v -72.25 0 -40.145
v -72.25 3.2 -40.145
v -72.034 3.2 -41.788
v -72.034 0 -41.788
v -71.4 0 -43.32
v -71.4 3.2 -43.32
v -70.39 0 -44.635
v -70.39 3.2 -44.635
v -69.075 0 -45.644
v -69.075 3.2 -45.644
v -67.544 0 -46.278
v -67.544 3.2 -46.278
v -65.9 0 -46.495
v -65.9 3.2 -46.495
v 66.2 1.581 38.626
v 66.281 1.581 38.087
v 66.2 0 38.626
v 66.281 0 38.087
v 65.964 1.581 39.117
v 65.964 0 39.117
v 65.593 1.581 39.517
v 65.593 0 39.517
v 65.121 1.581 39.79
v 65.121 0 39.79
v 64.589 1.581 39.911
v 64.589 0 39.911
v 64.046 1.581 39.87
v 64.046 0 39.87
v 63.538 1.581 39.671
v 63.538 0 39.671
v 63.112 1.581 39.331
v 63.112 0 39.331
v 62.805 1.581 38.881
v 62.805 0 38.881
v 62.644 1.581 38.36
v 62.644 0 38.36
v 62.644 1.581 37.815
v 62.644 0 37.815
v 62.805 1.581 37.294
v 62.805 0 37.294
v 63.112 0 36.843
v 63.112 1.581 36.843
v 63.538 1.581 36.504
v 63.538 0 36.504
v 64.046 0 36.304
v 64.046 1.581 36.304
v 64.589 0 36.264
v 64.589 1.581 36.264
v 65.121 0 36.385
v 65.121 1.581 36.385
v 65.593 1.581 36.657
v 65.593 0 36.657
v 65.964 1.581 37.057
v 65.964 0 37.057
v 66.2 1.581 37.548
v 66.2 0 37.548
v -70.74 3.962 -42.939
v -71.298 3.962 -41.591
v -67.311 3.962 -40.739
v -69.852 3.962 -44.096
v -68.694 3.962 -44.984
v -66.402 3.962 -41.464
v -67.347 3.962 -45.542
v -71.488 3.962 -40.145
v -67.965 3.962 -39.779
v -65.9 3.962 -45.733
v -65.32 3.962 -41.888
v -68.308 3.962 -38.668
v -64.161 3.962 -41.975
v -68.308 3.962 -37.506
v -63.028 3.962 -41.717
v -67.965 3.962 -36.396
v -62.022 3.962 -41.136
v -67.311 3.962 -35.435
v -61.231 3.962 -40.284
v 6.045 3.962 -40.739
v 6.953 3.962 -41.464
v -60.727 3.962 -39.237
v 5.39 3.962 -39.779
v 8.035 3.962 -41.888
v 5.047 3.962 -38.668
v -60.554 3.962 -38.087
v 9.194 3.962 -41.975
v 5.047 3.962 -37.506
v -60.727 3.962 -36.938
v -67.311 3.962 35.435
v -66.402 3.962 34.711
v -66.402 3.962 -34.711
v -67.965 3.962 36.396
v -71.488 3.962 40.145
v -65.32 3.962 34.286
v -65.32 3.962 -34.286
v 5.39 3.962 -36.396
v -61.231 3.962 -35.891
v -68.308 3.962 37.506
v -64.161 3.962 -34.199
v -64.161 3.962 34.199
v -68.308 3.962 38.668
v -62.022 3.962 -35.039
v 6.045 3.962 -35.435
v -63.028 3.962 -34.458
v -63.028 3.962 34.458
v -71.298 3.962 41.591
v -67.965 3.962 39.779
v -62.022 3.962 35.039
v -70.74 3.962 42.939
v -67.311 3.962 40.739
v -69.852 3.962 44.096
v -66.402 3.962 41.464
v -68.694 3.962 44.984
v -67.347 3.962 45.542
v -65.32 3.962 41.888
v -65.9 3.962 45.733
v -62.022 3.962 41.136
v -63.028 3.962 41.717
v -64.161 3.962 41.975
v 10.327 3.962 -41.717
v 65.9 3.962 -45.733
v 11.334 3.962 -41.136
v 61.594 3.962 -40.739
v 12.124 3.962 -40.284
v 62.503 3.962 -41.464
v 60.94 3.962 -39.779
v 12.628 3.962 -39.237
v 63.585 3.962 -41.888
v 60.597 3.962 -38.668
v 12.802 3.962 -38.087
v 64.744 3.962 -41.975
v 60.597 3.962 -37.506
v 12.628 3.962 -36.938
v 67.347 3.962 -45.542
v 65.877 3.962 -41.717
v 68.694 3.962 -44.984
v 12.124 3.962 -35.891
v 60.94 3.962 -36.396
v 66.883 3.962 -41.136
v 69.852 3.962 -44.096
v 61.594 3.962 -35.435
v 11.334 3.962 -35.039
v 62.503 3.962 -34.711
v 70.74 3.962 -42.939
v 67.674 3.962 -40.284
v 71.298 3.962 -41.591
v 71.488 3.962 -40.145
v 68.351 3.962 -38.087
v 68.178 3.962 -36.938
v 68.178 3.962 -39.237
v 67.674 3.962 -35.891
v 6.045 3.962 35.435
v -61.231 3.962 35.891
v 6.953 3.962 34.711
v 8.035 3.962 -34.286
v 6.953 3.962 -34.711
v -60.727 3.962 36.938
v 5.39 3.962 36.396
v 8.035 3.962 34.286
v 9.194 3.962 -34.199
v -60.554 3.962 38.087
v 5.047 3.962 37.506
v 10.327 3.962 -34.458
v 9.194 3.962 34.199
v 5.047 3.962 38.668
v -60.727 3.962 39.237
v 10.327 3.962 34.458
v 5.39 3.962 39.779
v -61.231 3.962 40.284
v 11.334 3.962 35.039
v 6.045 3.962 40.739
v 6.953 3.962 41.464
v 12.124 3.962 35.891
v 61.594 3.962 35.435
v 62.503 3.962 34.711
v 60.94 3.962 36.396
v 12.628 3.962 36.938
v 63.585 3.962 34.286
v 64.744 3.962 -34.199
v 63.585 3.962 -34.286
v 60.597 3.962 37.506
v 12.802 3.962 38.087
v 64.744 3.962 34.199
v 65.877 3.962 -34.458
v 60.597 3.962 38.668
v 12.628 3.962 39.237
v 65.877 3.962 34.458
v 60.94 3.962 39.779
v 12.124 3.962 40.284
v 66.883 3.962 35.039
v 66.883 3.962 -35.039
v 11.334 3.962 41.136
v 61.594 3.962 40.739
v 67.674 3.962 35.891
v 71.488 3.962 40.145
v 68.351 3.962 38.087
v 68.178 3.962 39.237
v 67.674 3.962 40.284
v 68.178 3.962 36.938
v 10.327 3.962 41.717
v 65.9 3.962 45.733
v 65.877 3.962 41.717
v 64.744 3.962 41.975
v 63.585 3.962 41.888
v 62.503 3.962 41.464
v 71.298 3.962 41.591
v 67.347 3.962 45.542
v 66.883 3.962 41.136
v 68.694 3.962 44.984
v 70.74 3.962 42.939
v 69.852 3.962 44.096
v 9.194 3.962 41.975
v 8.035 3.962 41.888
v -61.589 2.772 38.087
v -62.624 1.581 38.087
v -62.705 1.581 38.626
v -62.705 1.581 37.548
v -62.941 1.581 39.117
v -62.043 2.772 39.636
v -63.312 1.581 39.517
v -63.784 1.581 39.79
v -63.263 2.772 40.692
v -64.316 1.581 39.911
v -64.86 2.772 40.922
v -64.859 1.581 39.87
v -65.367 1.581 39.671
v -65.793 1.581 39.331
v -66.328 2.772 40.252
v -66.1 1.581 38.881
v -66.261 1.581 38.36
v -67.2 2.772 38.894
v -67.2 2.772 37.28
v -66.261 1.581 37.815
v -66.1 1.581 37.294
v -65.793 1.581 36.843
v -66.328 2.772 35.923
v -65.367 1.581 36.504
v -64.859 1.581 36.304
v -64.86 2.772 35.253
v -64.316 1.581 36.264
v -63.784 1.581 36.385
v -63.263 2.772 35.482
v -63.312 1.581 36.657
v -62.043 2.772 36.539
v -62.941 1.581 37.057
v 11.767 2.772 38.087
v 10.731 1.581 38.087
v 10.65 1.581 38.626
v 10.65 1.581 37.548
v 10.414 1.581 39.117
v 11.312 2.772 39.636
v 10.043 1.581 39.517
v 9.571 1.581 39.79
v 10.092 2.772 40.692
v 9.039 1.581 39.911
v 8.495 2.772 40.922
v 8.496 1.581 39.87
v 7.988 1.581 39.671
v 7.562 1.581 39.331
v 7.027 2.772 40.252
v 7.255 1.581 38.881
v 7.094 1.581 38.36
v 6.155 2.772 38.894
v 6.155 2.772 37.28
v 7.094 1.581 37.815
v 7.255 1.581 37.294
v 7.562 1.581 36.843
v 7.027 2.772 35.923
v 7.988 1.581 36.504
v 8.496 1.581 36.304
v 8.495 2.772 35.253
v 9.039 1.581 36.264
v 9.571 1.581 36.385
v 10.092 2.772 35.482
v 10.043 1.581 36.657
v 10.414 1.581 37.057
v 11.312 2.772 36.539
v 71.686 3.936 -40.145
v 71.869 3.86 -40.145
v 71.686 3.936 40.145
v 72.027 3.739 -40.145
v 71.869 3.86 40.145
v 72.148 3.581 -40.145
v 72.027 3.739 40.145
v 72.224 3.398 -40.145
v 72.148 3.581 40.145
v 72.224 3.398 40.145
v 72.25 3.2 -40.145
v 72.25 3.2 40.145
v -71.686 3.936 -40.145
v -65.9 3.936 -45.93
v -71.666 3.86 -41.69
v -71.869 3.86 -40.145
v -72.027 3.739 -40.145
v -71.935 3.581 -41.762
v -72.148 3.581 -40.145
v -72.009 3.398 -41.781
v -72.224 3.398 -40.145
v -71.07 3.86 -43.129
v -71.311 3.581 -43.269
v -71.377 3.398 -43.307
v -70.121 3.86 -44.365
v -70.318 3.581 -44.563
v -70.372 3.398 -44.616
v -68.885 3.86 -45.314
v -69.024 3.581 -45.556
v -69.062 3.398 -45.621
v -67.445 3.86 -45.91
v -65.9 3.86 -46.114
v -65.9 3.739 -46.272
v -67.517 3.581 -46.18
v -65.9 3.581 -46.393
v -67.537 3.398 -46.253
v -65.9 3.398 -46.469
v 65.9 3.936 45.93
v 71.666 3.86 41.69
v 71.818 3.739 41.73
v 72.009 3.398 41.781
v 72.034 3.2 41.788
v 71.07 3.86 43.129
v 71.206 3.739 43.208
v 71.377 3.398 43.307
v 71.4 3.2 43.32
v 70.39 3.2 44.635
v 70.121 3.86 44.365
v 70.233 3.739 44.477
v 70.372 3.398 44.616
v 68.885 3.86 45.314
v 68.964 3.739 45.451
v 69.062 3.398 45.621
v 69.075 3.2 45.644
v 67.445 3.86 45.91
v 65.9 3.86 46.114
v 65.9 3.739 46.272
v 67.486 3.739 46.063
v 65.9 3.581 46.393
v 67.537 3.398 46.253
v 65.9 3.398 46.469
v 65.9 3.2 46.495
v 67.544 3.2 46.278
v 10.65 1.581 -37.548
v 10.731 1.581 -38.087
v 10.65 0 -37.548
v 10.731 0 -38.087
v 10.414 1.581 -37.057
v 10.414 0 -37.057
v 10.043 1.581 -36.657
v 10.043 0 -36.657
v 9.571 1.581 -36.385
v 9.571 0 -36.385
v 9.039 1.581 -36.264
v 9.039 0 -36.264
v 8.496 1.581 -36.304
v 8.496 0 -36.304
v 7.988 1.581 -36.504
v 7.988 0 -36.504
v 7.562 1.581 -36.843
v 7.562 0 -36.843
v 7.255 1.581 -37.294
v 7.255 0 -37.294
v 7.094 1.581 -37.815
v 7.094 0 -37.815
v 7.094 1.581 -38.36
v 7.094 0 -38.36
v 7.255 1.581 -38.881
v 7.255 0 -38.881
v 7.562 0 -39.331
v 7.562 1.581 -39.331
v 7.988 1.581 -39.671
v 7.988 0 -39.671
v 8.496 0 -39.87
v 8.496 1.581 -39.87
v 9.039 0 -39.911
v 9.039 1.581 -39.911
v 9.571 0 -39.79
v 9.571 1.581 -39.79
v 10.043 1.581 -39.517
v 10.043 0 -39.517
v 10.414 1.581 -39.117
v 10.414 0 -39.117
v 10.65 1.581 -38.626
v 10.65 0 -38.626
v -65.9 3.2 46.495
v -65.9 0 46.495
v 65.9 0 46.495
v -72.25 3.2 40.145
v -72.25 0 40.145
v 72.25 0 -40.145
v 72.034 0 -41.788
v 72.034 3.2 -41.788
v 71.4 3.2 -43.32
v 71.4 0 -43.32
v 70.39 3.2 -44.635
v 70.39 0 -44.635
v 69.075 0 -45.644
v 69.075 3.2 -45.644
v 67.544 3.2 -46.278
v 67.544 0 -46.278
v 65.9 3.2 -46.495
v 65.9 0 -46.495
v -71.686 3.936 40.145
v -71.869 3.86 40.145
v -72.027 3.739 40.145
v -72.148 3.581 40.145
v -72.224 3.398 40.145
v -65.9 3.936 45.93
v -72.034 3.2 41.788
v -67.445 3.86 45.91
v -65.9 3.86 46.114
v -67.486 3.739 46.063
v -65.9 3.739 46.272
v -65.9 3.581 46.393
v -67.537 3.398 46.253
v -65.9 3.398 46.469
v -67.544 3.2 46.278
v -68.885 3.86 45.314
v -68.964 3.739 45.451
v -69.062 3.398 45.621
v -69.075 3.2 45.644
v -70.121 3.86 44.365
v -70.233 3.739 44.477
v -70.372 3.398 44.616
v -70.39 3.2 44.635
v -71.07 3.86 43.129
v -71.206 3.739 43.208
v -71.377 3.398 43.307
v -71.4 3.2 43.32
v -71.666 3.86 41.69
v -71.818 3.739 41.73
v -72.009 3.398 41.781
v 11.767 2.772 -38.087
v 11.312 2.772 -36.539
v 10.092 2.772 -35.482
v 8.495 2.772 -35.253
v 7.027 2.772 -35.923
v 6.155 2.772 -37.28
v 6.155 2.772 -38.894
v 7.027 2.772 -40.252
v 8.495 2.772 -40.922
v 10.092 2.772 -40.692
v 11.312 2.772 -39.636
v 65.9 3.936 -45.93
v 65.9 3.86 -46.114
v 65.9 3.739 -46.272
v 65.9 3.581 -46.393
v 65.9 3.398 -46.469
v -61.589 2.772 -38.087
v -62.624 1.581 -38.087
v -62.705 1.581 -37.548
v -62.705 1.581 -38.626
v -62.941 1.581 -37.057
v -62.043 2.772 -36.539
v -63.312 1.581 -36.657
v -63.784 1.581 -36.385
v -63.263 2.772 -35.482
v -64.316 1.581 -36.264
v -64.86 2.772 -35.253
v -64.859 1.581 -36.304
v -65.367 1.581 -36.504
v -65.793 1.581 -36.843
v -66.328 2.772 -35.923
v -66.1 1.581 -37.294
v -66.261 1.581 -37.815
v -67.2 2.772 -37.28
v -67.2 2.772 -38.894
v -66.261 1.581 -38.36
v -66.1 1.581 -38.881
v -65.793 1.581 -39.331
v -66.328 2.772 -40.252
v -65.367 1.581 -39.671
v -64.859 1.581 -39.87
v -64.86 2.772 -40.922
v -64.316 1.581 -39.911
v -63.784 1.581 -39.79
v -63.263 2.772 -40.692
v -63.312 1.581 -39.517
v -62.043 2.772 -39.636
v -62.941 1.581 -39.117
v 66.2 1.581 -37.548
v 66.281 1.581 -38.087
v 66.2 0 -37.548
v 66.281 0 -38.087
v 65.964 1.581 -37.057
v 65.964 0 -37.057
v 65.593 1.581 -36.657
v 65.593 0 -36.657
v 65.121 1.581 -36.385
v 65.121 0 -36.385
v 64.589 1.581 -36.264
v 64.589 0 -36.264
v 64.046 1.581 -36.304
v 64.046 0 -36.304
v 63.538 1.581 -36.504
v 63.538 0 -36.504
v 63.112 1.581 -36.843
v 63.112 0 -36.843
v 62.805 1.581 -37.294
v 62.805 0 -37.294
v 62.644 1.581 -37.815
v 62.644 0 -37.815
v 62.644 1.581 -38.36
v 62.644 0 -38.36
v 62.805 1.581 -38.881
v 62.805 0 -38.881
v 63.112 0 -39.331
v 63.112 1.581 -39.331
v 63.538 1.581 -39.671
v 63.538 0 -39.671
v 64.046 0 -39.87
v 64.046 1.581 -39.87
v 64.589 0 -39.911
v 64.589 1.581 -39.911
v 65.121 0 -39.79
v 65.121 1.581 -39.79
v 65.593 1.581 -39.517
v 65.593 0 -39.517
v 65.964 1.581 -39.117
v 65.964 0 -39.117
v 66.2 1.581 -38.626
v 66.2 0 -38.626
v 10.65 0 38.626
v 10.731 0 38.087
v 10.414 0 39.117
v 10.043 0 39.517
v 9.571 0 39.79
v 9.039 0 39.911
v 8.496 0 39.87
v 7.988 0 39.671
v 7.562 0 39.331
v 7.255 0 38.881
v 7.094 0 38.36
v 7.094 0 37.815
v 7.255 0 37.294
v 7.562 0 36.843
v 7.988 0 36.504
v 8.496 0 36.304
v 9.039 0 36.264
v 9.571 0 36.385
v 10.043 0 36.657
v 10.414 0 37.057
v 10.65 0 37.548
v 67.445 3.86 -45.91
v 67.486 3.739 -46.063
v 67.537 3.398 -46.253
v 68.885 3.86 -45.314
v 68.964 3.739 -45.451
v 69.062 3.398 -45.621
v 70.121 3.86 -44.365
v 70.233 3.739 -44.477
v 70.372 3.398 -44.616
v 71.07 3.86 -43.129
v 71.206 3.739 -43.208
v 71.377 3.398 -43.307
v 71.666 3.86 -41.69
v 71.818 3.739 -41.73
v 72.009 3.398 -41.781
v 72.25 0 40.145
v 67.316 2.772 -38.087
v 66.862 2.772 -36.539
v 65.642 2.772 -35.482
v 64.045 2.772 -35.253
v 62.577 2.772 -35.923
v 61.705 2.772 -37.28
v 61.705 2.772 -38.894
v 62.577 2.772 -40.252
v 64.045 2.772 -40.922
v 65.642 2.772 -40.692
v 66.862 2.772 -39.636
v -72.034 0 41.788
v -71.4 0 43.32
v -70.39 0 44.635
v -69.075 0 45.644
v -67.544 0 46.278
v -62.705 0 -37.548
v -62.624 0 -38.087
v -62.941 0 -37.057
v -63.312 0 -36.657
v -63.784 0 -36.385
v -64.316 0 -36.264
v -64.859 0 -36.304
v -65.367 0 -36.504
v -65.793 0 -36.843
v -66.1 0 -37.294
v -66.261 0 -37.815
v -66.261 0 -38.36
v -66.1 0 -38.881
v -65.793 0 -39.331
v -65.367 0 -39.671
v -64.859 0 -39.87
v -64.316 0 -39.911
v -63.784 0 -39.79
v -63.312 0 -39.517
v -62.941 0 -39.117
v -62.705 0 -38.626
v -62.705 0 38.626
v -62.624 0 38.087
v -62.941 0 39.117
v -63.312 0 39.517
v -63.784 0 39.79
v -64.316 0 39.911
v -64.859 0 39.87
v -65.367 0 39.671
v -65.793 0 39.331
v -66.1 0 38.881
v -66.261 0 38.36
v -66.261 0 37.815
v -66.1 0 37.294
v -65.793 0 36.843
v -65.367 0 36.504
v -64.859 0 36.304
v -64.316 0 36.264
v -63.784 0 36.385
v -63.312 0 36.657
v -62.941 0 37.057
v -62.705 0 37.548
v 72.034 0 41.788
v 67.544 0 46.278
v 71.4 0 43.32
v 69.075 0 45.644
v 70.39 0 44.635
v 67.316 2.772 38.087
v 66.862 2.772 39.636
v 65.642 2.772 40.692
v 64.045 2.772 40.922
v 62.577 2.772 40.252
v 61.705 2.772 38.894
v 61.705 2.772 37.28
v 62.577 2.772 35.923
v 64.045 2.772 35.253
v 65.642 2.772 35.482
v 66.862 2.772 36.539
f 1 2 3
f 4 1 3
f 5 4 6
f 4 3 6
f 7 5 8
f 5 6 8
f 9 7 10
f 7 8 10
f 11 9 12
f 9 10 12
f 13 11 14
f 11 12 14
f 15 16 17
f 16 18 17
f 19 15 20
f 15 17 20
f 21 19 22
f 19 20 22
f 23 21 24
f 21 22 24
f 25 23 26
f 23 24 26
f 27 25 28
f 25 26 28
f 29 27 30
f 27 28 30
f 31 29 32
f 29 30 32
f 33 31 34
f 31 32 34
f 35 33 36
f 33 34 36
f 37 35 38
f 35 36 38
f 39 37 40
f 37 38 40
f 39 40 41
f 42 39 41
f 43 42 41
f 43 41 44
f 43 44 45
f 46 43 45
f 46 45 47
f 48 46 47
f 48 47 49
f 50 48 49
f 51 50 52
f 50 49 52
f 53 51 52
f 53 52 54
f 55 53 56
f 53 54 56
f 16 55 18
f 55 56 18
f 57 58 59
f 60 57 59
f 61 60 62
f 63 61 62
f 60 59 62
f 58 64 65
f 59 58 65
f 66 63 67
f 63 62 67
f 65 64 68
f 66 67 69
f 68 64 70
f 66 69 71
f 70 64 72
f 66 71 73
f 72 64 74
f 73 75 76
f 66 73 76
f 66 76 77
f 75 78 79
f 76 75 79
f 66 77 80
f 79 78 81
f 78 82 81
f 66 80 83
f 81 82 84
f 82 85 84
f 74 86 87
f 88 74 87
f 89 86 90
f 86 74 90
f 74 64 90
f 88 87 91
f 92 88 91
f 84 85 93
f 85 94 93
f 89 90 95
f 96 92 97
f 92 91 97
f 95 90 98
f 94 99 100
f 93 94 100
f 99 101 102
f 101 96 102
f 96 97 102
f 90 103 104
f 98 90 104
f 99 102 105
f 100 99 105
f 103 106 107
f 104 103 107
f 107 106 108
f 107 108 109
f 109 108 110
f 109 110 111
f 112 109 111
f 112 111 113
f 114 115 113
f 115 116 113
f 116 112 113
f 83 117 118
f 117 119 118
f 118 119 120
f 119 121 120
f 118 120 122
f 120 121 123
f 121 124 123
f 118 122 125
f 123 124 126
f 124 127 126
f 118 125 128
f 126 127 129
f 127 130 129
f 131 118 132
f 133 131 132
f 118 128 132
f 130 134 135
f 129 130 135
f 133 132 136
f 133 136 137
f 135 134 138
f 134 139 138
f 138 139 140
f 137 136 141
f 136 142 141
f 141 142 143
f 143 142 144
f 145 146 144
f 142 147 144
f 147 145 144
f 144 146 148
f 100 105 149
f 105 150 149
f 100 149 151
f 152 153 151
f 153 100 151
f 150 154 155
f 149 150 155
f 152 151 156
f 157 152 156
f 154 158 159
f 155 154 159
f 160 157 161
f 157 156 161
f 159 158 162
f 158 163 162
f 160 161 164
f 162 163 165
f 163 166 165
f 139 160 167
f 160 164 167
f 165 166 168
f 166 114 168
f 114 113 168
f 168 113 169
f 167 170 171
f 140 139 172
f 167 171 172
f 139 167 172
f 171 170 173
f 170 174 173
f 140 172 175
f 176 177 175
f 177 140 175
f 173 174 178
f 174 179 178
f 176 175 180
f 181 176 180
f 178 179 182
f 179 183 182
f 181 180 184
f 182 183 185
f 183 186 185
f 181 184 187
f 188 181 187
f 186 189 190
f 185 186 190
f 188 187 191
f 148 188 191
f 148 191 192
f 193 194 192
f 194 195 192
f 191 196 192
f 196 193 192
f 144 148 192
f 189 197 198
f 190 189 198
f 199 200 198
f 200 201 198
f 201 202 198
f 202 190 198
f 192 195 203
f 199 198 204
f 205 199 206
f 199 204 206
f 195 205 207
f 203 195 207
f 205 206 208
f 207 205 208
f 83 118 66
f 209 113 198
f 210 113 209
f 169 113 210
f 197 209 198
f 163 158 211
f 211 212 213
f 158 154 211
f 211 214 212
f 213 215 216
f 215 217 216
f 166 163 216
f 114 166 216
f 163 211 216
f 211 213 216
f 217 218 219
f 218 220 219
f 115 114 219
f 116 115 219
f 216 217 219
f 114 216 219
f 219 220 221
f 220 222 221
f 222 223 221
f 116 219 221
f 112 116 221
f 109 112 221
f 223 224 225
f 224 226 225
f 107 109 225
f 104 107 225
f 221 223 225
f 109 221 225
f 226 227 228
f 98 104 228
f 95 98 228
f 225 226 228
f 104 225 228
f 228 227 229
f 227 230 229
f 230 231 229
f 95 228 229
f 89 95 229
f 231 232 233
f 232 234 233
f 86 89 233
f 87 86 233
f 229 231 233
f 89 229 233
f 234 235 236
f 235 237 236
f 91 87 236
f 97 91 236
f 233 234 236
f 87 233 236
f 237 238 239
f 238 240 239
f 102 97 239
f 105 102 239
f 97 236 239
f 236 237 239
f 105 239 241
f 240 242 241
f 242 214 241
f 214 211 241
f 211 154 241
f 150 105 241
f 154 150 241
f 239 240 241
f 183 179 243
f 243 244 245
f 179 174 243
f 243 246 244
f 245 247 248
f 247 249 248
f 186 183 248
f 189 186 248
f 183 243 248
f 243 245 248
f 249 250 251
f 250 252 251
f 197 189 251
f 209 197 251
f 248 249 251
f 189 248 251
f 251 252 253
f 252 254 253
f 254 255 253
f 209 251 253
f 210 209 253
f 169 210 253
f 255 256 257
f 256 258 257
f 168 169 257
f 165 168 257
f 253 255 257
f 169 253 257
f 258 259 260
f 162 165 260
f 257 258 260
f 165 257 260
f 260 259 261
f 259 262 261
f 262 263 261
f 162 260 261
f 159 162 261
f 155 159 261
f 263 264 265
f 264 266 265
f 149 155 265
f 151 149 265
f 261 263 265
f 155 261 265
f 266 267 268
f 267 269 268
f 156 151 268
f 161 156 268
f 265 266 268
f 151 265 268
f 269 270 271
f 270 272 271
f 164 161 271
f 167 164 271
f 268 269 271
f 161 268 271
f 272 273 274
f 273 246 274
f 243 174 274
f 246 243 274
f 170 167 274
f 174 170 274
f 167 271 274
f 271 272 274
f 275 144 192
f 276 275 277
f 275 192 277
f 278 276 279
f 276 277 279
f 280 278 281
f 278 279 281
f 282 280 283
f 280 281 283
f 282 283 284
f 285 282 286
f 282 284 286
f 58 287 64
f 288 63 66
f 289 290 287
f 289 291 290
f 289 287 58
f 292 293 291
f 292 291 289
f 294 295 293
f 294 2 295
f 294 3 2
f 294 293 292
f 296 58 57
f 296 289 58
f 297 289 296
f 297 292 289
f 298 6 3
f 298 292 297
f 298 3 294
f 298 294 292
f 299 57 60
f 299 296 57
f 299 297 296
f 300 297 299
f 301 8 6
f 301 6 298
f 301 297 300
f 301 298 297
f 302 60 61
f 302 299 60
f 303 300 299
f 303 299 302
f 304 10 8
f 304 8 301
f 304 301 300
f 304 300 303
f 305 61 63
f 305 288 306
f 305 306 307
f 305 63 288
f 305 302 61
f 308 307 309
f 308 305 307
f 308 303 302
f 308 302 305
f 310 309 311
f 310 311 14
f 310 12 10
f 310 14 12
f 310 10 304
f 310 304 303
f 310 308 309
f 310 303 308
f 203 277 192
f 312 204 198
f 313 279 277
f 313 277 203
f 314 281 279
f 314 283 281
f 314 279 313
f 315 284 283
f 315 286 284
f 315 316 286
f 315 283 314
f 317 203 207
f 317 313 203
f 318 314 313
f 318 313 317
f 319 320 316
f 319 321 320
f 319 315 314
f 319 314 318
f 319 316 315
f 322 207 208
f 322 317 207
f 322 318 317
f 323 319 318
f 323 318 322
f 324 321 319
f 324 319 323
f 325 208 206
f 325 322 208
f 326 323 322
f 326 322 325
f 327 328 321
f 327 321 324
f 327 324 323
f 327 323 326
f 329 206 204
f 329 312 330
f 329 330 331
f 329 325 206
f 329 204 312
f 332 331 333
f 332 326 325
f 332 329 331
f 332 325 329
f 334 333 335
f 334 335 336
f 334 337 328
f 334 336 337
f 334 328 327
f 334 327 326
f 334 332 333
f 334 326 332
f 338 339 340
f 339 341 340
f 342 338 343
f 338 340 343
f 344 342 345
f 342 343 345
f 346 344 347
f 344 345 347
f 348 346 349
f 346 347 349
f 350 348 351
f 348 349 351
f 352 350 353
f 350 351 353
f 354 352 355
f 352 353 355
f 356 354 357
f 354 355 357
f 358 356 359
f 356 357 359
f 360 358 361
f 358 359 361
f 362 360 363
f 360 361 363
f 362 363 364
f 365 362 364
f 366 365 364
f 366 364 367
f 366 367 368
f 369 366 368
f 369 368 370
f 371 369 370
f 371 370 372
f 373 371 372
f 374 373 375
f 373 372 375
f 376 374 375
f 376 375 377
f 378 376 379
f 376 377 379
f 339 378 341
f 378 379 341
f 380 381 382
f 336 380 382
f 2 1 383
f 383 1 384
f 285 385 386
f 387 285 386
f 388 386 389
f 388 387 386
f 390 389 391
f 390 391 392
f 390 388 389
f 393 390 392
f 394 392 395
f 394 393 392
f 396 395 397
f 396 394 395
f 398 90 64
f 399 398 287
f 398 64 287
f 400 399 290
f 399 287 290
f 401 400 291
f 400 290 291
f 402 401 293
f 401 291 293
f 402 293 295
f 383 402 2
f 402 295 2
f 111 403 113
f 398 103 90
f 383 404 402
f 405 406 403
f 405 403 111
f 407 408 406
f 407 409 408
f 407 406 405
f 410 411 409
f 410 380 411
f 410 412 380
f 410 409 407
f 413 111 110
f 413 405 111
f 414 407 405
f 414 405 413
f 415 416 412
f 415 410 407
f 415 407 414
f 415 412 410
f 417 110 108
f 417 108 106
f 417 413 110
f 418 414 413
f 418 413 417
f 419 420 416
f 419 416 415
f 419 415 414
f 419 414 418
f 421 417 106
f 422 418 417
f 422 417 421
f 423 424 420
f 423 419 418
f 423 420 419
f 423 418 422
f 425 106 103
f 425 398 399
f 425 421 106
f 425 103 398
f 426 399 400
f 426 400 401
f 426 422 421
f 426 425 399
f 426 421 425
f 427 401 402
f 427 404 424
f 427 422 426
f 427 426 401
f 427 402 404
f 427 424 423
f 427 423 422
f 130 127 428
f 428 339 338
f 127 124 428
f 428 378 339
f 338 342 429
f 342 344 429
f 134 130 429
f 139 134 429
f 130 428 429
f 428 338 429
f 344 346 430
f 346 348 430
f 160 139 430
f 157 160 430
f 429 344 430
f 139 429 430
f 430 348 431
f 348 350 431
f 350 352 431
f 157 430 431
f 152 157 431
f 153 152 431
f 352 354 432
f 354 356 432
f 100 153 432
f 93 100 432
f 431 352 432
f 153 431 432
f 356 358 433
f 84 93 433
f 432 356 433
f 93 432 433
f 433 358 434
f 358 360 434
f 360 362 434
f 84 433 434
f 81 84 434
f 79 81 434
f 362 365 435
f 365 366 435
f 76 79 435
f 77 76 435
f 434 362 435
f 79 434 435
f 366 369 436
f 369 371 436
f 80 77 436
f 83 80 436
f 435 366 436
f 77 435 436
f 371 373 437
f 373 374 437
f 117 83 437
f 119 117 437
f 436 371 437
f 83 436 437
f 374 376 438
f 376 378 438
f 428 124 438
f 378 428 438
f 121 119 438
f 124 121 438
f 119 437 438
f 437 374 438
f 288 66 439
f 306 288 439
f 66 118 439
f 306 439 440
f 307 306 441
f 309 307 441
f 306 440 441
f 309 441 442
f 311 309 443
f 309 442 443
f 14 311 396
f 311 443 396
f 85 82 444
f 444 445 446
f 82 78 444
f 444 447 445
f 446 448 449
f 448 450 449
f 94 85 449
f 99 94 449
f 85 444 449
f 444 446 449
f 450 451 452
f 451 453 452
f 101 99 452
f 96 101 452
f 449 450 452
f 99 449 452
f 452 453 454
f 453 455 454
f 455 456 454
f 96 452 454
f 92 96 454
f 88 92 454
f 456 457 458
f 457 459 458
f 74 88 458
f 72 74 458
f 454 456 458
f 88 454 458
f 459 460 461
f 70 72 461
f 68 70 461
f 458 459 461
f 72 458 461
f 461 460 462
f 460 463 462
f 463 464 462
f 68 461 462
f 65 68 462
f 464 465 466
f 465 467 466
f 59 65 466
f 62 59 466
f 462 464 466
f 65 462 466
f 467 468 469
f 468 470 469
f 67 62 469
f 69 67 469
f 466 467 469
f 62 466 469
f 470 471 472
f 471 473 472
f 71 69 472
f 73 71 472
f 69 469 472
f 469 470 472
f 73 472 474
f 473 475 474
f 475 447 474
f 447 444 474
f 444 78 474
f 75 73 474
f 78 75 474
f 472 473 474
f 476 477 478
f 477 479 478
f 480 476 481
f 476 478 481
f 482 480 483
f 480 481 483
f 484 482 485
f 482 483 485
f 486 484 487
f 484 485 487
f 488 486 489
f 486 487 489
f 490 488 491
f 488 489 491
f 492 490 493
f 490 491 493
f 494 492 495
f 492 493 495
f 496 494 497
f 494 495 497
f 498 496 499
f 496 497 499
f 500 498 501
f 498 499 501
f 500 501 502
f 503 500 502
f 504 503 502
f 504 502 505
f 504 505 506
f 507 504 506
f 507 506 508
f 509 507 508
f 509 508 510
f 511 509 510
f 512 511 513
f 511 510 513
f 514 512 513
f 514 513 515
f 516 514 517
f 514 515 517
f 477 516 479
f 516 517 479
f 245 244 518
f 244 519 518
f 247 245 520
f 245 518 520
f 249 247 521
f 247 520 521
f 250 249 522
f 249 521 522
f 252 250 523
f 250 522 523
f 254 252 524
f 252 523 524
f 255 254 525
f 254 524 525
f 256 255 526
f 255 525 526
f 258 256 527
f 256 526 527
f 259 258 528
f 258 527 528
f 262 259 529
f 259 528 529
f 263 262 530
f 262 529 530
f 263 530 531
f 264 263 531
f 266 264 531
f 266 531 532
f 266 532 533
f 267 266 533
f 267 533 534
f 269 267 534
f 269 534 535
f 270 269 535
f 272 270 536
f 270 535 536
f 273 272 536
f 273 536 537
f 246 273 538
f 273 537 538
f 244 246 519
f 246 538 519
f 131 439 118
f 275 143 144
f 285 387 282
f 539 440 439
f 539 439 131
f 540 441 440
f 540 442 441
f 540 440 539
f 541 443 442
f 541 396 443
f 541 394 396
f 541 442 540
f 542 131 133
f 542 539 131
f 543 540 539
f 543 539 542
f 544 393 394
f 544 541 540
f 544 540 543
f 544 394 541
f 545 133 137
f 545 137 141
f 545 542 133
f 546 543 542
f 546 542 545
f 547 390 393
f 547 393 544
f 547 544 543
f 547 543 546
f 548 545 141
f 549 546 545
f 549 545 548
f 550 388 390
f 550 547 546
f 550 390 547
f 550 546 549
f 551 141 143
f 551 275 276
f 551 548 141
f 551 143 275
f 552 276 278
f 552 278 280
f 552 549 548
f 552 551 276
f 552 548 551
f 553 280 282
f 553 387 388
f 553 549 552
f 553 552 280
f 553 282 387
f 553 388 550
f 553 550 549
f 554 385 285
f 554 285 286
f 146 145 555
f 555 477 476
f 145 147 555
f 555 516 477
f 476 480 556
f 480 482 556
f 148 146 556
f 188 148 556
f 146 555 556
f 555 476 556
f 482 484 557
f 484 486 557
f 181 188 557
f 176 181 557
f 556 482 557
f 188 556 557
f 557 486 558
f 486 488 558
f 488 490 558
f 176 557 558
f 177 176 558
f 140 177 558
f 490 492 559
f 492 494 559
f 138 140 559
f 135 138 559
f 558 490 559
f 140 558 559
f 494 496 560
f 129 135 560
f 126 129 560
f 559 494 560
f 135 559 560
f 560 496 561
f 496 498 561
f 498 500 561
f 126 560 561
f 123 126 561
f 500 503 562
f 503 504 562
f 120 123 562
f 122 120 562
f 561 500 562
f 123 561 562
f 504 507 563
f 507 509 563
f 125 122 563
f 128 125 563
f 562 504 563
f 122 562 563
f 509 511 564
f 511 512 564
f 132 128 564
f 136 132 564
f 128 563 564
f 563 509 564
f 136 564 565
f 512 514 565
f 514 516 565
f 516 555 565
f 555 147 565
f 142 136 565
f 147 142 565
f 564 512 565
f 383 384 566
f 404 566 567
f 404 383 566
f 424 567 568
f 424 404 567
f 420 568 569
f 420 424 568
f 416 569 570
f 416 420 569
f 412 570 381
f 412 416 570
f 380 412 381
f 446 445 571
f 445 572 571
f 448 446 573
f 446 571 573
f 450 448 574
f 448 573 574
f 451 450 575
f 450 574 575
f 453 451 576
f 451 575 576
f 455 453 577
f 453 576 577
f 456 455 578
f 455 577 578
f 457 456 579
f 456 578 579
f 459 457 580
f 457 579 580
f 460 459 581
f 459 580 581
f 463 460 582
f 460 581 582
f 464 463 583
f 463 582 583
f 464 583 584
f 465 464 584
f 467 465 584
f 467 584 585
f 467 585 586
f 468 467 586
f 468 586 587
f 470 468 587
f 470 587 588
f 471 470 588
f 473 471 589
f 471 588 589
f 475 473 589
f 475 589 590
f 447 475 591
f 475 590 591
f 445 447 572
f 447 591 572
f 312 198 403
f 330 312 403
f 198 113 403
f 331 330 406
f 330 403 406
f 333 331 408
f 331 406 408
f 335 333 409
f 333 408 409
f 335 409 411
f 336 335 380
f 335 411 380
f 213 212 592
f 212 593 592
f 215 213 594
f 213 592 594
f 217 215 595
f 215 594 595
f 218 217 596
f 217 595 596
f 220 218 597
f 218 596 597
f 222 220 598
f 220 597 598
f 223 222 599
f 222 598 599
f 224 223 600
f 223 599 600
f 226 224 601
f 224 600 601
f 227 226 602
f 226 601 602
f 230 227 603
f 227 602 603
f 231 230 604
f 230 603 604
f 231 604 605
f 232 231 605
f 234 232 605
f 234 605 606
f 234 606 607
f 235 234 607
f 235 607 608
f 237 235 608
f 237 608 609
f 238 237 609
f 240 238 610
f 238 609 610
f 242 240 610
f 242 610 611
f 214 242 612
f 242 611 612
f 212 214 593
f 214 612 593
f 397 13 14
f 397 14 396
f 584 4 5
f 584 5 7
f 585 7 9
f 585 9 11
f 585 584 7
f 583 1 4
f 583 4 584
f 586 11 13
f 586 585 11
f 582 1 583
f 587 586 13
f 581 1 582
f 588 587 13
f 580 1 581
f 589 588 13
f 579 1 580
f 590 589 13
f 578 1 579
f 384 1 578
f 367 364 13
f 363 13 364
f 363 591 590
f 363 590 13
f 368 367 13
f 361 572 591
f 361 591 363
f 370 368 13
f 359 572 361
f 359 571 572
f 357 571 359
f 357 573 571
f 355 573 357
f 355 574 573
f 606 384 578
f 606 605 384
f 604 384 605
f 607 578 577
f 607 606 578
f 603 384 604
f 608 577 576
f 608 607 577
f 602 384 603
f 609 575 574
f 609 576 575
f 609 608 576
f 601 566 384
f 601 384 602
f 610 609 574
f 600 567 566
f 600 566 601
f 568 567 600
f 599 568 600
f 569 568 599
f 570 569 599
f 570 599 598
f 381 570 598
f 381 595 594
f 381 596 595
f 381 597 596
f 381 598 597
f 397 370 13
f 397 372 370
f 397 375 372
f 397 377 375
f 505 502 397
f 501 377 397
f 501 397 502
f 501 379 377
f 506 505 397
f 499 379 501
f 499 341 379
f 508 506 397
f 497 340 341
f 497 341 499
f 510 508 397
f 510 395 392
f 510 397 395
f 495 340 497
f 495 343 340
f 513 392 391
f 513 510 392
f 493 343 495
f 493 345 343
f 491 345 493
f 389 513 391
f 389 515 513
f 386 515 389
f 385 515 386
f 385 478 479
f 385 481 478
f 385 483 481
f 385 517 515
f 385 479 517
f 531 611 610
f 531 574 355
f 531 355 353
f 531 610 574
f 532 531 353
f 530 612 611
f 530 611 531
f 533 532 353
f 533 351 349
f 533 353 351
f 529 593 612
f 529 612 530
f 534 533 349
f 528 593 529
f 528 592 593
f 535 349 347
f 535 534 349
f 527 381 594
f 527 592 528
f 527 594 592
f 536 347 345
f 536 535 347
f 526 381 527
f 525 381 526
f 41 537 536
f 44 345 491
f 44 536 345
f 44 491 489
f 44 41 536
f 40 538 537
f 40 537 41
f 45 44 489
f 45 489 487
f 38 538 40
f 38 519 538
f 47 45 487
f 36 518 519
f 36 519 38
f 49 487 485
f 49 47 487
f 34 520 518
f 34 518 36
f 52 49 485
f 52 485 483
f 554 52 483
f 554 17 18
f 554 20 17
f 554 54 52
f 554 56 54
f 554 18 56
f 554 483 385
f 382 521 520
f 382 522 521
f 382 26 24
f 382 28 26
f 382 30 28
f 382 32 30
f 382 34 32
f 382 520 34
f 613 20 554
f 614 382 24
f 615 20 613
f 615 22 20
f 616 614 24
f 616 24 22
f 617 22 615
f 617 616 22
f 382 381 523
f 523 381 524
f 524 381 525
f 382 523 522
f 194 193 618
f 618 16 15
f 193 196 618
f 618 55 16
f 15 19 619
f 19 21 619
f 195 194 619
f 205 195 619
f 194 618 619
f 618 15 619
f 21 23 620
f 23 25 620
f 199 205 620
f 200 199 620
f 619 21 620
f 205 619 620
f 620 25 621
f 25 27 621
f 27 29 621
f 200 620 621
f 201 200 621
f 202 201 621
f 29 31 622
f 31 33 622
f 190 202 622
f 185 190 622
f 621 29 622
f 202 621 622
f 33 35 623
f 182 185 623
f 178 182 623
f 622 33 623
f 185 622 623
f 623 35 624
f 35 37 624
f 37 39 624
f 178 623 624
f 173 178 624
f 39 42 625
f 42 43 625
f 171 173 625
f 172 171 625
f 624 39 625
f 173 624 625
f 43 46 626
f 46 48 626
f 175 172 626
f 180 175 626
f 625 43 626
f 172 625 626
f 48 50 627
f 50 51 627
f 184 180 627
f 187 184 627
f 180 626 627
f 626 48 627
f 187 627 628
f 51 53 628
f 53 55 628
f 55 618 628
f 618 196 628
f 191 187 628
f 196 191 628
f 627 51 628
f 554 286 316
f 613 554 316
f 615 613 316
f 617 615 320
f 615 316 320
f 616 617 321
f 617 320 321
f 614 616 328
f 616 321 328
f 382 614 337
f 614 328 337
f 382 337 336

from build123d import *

# Parameters (mm, degrees)
F0_W           = 144.5006
F0_H           = 92.9894
F1_DEPTH       = 3.9624
F3_D           = 3.6576
F3_CSINK_D     = 7.7978
F3_CSINK_ANGLE = 82
F4_R           = 6.35
F5_R           = 0.762


with BuildPart() as f1:
    # F0 (on Front) → F1 (new body)
    with BuildSketch(Plane.XZ):
        Rectangle(F0_W, F0_H)
    extrude(amount=-F1_DEPTH)

    # F3 (through all)
    with Locations(Plane(origin=(0, 3.9624, 0), x_dir=(-1, 0, 0), z_dir=(0, 1, 0))):
        with Locations((-64.4525, 38.0873), (-8.9027, 38.0873), (64.4525, 38.0873), (64.4525, -38.0873), (-8.9027, -38.0873), (-64.4525, -38.0873)):
            CounterSinkHole(F3_D / 2, F3_CSINK_D / 2, counter_sink_angle=F3_CSINK_ANGLE)

    # F4
    f4_edges = [f1.edges().sort_by_distance(p)[0] for p in [
        (72.2503, 1.9812, 46.4947),
        (72.2503, 1.9812, -46.4947),
        (-72.2503, 1.9812, -46.4947),
        (-72.2503, 1.9812, 46.4947),
    ]]
    fillet(f4_edges, radius=F4_R)

    # F5
    f5_edges = [f1.edges().sort_by_distance(p)[0] for p in [
        (0, 3.9624, -46.4947),
    ]]
    fillet(f5_edges, radius=F5_R)


solid = f1.part
